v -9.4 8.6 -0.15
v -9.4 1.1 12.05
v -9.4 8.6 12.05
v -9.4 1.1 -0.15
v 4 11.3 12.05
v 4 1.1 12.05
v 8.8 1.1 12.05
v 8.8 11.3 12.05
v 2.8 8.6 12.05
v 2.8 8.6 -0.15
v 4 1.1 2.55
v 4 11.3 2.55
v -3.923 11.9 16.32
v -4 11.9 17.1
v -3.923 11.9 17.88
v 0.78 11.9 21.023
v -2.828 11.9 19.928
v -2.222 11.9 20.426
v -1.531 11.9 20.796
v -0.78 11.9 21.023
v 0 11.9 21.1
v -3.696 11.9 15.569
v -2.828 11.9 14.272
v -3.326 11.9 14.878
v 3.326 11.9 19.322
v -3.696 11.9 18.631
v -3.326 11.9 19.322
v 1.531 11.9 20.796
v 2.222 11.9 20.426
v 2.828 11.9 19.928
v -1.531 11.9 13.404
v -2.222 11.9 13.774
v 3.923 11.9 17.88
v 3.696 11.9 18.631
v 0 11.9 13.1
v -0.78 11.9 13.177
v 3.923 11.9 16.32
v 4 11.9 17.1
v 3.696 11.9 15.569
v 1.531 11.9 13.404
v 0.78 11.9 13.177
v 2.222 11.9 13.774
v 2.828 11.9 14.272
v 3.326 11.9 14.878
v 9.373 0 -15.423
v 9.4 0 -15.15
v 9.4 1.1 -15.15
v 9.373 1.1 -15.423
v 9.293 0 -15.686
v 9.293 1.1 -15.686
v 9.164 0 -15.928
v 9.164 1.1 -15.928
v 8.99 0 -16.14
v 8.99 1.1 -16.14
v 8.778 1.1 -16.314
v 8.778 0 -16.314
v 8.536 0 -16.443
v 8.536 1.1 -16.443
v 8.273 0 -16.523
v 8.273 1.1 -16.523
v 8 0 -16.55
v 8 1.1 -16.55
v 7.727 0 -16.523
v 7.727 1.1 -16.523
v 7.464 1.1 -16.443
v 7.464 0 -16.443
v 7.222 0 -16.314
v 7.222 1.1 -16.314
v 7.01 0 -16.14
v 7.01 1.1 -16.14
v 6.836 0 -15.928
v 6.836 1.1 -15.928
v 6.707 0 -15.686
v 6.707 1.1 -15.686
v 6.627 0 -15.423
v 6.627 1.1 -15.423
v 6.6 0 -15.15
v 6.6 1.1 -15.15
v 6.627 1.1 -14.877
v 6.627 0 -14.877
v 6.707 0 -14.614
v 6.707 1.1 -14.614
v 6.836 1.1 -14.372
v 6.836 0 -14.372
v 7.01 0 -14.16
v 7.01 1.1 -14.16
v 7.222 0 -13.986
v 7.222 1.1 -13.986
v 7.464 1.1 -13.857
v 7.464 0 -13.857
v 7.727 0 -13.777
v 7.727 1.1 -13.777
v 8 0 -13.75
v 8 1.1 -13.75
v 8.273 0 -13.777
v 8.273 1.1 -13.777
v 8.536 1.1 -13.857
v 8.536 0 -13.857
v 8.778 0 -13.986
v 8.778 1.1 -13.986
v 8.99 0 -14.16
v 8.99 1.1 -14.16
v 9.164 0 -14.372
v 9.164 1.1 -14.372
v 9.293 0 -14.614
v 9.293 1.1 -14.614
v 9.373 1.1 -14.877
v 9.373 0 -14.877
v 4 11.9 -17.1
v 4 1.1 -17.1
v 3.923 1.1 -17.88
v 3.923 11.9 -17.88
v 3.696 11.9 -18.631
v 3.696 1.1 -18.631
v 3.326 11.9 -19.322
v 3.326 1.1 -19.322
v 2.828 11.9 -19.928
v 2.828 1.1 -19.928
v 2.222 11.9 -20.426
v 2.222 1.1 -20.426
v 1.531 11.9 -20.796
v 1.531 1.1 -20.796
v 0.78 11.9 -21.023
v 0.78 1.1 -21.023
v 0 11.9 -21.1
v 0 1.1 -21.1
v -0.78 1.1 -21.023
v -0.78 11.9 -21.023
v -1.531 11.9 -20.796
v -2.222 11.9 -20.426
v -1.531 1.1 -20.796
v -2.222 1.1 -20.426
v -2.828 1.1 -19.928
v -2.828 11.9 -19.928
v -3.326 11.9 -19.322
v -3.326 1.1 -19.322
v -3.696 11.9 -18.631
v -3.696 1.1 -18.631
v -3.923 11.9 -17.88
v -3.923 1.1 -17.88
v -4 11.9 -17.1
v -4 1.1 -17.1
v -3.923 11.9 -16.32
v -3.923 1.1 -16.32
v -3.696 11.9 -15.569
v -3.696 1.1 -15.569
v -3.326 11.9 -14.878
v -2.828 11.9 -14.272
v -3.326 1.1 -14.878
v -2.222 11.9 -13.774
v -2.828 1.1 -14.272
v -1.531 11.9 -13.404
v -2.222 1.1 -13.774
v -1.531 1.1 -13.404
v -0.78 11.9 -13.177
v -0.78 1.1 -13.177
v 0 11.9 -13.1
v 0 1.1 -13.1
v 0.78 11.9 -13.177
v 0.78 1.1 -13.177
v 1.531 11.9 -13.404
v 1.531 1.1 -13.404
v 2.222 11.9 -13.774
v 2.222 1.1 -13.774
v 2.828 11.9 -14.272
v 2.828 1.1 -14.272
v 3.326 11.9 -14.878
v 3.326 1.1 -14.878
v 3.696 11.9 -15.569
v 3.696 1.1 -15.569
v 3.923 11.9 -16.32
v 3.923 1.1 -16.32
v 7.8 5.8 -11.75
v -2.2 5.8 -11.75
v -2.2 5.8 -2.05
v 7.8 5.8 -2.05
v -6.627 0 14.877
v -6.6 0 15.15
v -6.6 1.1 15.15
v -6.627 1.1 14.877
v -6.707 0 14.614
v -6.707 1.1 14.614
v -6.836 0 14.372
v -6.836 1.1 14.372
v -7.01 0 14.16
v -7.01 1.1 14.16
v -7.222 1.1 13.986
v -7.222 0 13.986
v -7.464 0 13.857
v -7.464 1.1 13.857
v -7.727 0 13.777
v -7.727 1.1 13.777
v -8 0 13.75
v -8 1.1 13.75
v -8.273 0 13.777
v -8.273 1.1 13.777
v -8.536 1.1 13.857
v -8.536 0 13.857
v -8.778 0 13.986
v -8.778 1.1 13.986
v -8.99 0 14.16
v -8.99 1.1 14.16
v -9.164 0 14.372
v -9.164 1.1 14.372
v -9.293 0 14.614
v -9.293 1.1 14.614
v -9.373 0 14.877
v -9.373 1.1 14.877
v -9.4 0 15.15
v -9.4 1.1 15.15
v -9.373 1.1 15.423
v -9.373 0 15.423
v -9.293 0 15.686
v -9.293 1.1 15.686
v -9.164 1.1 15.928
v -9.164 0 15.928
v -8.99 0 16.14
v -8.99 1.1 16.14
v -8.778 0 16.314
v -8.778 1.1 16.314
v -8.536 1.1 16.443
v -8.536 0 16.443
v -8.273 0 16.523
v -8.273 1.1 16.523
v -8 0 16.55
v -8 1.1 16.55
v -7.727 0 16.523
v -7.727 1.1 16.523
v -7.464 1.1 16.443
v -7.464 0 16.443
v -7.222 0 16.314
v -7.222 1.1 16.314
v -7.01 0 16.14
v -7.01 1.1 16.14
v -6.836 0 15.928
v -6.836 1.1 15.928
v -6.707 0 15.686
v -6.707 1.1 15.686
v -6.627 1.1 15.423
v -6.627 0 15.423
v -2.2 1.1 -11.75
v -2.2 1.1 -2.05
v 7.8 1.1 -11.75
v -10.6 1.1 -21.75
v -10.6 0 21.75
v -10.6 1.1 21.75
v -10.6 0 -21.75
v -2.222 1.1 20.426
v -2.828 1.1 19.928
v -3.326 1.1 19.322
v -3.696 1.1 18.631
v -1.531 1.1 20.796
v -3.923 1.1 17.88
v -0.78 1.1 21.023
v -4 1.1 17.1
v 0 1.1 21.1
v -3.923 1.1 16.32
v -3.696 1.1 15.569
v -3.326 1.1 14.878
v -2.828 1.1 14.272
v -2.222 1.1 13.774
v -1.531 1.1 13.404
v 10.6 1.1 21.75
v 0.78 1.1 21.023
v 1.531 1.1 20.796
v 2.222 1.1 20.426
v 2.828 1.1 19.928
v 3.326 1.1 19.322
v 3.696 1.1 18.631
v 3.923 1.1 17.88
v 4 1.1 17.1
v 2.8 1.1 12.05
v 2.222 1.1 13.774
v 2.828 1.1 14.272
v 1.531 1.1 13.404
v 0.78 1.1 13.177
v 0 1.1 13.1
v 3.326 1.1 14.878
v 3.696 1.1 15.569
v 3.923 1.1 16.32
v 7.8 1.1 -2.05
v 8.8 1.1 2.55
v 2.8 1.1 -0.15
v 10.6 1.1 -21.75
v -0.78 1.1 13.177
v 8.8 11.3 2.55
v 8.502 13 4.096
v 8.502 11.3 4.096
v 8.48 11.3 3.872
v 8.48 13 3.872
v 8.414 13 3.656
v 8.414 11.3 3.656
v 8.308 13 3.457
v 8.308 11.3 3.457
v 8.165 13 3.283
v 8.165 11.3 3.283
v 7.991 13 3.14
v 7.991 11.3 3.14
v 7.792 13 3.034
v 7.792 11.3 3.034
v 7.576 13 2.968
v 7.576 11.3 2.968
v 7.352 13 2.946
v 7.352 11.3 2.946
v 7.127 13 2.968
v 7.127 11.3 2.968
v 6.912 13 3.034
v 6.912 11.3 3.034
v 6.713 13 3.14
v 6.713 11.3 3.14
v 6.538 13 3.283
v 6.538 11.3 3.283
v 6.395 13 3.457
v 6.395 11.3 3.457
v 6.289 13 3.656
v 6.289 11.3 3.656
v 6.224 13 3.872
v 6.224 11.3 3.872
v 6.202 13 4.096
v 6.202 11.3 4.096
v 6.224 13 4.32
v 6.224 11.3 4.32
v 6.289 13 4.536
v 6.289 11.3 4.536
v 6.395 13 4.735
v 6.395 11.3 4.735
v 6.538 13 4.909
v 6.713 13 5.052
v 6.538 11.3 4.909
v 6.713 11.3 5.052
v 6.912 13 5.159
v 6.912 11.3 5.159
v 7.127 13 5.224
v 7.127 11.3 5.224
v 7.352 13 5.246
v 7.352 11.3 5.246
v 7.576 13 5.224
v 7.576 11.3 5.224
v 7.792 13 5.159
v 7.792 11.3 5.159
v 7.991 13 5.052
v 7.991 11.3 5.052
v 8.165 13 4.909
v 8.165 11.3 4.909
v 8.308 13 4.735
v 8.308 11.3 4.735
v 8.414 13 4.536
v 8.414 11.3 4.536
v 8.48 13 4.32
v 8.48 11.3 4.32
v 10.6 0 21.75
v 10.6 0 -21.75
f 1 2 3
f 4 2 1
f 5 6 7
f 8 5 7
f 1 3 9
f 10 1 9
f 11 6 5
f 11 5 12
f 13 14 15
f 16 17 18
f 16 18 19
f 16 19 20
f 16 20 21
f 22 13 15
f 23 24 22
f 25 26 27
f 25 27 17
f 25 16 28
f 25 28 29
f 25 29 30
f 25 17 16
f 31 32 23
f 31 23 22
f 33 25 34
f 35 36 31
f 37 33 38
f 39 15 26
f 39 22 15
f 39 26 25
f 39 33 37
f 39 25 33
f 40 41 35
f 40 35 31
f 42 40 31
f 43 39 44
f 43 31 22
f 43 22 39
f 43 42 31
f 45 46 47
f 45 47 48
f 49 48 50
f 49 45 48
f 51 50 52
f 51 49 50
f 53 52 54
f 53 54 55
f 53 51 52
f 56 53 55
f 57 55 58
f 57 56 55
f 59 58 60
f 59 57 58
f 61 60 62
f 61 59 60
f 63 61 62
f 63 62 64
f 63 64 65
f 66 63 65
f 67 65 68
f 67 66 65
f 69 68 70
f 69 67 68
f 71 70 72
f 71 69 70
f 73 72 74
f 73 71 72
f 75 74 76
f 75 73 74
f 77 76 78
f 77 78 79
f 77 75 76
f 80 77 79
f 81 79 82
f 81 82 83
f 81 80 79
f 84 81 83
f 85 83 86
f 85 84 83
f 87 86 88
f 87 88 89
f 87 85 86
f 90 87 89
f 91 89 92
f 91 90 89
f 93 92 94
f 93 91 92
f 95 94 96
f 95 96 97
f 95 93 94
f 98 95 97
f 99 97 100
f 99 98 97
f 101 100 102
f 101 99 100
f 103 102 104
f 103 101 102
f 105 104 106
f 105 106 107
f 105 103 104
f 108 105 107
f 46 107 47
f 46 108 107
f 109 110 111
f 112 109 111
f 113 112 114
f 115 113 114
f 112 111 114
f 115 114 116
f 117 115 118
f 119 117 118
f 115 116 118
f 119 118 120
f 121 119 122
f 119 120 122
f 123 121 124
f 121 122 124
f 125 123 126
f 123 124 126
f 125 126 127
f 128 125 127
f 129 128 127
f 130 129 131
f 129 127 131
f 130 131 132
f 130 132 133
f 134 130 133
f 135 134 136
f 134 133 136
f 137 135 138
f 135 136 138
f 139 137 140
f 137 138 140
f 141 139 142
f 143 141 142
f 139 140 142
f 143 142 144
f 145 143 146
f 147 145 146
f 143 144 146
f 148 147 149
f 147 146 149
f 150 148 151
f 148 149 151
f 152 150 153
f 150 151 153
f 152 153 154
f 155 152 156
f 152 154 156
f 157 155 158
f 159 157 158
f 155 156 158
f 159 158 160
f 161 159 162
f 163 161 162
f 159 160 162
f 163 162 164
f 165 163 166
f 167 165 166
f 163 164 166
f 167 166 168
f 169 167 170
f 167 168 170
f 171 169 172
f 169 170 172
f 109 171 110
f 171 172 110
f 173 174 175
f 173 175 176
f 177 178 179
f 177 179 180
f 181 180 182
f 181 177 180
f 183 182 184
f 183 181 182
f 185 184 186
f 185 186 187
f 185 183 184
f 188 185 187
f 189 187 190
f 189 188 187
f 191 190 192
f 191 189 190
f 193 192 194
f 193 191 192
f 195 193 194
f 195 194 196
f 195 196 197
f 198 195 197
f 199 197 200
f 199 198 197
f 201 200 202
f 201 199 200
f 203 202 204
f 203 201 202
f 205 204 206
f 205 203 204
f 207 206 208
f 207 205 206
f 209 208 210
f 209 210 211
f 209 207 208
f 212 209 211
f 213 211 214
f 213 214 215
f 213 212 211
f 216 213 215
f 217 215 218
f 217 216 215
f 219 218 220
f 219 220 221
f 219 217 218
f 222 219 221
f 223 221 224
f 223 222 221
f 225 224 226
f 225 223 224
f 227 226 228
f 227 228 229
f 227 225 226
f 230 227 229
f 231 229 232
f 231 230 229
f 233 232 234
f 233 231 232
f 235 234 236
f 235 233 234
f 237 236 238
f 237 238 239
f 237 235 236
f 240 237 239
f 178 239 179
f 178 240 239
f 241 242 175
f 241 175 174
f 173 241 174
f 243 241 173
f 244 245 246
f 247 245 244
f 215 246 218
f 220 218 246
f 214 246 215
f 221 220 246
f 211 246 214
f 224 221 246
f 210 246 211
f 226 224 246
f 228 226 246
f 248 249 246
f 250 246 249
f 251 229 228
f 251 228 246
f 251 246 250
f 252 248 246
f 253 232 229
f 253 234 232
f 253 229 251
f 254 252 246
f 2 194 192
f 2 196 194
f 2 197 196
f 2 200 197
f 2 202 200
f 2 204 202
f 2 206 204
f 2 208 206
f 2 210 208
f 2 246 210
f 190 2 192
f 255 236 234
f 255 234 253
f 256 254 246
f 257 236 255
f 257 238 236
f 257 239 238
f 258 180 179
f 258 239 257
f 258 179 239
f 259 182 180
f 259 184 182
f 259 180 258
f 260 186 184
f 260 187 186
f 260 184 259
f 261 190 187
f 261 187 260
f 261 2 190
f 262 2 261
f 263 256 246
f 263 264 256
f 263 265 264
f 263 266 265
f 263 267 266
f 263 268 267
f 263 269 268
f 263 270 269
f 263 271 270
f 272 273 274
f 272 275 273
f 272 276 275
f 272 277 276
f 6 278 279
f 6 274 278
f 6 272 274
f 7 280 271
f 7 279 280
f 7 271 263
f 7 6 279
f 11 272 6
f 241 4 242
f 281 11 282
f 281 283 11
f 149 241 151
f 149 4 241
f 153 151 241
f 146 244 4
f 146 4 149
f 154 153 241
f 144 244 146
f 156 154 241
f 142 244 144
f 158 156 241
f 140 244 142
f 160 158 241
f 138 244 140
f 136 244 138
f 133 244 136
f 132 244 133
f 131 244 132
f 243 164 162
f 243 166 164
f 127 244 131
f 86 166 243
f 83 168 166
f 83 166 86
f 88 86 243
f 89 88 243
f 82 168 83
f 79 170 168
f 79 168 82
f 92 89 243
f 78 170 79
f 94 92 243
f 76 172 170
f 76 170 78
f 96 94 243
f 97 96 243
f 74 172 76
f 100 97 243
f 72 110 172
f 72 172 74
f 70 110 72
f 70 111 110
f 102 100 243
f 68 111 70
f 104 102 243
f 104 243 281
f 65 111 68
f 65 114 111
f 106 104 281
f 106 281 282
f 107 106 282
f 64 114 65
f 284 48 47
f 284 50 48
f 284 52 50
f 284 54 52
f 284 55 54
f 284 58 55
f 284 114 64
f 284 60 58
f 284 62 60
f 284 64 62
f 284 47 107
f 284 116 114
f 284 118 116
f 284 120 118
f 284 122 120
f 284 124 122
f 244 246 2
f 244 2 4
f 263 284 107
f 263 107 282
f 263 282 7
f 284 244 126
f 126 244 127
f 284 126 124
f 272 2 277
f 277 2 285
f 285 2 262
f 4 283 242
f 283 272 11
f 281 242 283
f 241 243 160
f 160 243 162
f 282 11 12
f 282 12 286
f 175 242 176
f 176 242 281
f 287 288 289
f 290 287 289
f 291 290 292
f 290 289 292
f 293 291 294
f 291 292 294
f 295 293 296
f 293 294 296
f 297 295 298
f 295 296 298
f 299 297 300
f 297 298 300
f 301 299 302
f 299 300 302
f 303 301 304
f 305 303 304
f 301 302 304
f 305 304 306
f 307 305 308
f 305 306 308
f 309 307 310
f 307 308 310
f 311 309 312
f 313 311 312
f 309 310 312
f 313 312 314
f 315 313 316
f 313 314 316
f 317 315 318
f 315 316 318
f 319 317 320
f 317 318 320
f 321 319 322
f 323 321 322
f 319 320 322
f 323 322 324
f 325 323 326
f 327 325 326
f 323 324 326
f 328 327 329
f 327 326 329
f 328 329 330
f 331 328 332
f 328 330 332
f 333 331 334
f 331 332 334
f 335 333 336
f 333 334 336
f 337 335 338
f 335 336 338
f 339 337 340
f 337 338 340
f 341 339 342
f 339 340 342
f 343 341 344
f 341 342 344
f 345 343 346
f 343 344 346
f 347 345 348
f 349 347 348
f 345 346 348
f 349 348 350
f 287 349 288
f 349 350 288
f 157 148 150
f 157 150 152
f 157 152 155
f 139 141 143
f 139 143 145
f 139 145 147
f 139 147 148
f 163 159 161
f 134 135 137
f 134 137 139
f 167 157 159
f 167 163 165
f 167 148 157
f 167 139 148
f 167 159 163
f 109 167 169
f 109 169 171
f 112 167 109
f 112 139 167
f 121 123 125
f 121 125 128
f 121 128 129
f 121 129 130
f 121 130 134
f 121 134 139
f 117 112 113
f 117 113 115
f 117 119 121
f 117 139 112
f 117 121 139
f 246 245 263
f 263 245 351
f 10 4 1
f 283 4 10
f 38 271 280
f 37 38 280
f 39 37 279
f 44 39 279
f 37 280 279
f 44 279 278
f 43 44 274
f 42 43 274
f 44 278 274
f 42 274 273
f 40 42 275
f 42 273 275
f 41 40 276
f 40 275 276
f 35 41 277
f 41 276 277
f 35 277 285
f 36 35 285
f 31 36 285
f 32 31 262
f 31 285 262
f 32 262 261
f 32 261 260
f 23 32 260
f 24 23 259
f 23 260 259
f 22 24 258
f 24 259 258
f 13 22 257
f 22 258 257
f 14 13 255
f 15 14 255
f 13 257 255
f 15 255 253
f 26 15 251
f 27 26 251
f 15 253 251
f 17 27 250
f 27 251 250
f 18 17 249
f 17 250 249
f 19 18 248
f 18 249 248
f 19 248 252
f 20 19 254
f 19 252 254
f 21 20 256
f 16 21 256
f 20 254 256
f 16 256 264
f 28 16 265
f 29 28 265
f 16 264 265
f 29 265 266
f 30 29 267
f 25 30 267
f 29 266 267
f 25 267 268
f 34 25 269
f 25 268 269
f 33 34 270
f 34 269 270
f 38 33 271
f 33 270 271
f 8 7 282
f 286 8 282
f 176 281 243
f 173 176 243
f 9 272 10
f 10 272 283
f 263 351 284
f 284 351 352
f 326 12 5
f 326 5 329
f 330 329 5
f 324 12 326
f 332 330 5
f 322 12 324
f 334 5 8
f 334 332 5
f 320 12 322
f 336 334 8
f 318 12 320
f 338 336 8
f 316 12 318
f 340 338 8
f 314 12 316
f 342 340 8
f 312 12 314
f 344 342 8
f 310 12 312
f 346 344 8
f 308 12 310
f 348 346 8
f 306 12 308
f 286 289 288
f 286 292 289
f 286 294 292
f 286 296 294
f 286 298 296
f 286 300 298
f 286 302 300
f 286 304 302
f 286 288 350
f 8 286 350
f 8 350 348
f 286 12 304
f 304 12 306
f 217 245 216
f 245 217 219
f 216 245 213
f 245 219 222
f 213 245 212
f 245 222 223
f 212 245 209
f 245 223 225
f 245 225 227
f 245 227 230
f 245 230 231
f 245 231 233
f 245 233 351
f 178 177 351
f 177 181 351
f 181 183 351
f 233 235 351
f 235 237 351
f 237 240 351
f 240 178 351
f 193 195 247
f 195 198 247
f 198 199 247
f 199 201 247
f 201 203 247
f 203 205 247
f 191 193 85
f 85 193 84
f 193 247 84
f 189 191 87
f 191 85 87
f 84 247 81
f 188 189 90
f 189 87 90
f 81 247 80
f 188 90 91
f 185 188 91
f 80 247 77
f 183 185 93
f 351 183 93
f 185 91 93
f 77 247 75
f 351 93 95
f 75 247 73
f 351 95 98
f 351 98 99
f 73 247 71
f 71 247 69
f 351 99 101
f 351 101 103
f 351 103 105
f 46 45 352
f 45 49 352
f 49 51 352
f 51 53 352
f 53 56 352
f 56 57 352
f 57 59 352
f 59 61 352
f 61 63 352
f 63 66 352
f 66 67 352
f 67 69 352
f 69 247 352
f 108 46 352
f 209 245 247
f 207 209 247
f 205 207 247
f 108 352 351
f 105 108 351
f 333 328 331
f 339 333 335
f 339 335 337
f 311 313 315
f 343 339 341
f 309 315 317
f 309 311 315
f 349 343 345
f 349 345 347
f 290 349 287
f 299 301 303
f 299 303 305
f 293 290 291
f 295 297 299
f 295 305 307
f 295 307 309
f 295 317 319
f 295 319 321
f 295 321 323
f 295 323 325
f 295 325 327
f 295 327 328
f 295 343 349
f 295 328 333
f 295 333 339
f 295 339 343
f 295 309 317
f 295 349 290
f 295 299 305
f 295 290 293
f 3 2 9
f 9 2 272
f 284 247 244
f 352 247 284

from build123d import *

# Parameters (mm, degrees)
SKETCH_1_W      = 21.2
SKETCH_1_H      = 43.5
SKETCH_1_R      = 1.4
EXTRUDE_1_DEPTH = 1.1
SKETCH_2_R      = 4
EXTRUDE_2_DEPTH = 10.8
SKETCH_3_W      = 12.2
SKETCH_3_H      = 12.2
EXTRUDE_3_DEPTH = 7.5
SKETCH_4_W      = 4.8
SKETCH_4_H      = 9.5
EXTRUDE_4_DEPTH = 10.2
SKETCH_5_W      = 10
SKETCH_5_H      = 9.7
EXTRUDE_5_DEPTH = 4.7
SKETCH_6_R      = 1.15
EXTRUDE_6_DEPTH = 1.7


with BuildPart() as part:
    # 草图1 → 凸台-拉伸1 (new body)
    with BuildSketch(Plane(origin=(0, 0, 0), x_dir=(1, 0, 0), z_dir=(0, 1, 0))):
        Rectangle(SKETCH_1_W, SKETCH_1_H)
        with Locations((8, 15.15)):
            Circle(SKETCH_1_R, mode=Mode.SUBTRACT)
        with Locations((-8, -15.15)):
            Circle(SKETCH_1_R, mode=Mode.SUBTRACT)
    extrude(amount=EXTRUDE_1_DEPTH)

    # 草图2 → 凸台-拉伸2 (add)
    with BuildSketch(Plane(origin=(0, 1.1, 0), x_dir=(1, 0, 0), z_dir=(0, 1, 0))):
        with Locations((0, 17.1)):
            Circle(SKETCH_2_R)
        with Locations((0, -17.1)):
            Circle(SKETCH_2_R)
    extrude(amount=EXTRUDE_2_DEPTH)

    # 草图3 → 凸台-拉伸3 (add)
    with BuildSketch(Plane(origin=(0, 1.1, 0), x_dir=(1, 0, 0), z_dir=(0, 1, 0))):
        with Locations((-3.3, -5.95)):
            Rectangle(SKETCH_3_W, SKETCH_3_H)
    extrude(amount=EXTRUDE_3_DEPTH)

    # 草图4 → 凸台-拉伸4 (add)
    with BuildSketch(Plane(origin=(0, 1.1, 0), x_dir=(1, 0, 0), z_dir=(0, 1, 0))):
        with Locations((6.4, -7.3)):
            Rectangle(SKETCH_4_W, SKETCH_4_H)
    extrude(amount=EXTRUDE_4_DEPTH)

    # 草图5 → 凸台-拉伸5 (add)
    with BuildSketch(Plane(origin=(0, 1.1, 0), x_dir=(1, 0, 0), z_dir=(0, 1, 0))):
        with Locations((2.8, 6.9)):
            Rectangle(SKETCH_5_W, SKETCH_5_H)
    extrude(amount=EXTRUDE_5_DEPTH)

    # 草图6 → 凸台-拉伸6 (add)
    with BuildSketch(Plane(origin=(0, 11.3, 0), x_dir=(1, 0, 0), z_dir=(0, 1, 0))):
        with Locations((7.351662329, -4.096039532)):
            Circle(SKETCH_6_R)
    extrude(amount=EXTRUDE_6_DEPTH)


solid = part.part
